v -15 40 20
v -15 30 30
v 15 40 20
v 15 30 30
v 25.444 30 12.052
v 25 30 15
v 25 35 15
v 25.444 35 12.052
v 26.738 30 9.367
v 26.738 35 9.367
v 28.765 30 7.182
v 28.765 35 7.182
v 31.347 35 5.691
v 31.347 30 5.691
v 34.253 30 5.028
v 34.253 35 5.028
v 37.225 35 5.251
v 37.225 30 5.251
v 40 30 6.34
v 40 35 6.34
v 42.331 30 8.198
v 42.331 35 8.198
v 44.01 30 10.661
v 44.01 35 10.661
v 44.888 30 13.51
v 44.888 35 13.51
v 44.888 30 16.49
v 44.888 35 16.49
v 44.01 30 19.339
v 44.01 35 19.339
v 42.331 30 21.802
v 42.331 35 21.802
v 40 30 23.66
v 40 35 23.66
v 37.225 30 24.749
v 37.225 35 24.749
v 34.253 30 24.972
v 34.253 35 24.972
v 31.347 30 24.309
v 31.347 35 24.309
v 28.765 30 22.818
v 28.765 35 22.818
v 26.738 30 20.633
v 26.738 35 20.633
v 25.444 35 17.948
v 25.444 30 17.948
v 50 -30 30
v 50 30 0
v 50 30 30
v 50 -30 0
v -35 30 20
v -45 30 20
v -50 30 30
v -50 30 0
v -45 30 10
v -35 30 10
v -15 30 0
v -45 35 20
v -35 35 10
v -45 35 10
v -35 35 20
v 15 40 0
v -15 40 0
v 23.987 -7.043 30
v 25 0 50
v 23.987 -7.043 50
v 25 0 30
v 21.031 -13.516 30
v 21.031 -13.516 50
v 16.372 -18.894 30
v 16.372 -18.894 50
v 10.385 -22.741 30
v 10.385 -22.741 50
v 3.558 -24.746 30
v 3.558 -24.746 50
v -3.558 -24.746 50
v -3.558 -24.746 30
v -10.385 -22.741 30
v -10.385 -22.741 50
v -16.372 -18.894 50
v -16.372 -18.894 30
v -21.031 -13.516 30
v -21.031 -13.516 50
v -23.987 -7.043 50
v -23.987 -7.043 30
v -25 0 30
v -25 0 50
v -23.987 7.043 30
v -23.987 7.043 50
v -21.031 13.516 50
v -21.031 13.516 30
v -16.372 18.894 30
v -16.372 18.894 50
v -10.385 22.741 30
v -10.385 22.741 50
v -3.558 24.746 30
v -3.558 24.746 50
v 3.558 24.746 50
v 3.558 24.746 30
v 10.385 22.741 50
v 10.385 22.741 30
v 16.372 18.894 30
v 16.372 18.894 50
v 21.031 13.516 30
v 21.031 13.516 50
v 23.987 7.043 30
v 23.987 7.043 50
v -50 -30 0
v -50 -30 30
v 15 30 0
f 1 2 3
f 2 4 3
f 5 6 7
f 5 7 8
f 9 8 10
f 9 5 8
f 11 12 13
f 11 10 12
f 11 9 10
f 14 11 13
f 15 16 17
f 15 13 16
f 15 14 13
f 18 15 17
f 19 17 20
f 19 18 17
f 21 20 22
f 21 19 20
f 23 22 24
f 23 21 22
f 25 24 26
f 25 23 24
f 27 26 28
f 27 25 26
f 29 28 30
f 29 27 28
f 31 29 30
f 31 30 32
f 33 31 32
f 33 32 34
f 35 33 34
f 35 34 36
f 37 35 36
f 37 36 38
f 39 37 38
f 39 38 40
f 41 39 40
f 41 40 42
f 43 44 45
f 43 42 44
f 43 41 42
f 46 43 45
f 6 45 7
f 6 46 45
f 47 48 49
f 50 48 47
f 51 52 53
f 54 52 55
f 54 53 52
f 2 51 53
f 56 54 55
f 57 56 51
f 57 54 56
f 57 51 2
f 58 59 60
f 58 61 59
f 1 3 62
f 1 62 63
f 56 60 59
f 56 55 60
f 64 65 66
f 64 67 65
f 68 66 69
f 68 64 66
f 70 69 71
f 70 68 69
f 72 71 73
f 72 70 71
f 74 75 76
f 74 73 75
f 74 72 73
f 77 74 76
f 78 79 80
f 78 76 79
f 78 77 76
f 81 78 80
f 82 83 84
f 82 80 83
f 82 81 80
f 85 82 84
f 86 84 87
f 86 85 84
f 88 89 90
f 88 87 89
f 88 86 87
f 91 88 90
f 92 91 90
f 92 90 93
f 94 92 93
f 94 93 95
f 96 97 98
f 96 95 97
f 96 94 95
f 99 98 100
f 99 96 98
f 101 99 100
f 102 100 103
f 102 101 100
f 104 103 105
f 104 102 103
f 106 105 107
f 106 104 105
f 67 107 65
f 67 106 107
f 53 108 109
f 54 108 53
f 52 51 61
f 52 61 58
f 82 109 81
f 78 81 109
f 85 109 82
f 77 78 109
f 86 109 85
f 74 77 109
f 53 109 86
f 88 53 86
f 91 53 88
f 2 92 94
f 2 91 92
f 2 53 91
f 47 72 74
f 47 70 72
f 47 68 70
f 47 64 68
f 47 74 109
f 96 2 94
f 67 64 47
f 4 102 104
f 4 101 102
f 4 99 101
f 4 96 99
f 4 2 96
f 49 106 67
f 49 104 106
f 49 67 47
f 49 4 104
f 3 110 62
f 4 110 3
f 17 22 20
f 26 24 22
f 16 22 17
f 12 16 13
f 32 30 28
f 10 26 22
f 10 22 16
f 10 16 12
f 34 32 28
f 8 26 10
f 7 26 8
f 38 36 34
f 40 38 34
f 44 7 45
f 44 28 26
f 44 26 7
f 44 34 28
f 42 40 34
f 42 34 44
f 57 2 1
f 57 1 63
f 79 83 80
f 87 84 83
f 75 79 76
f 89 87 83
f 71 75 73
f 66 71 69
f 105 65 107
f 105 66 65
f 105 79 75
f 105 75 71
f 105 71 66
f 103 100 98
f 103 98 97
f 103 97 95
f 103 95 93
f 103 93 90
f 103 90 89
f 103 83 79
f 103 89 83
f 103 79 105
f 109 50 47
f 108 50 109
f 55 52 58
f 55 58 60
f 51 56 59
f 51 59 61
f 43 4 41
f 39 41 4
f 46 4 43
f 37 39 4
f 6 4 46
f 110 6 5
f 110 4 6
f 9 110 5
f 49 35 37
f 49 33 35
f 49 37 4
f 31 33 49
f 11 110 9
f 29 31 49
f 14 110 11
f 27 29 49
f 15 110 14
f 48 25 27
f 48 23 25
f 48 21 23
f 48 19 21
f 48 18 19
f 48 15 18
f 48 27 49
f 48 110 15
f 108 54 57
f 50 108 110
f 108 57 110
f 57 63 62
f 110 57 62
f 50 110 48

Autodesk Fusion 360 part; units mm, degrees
sketch "Sketch1" plane through (0, 0, 0) normal (0, 0, 1) x (1, 0, 0)
  line L0 (-50, 30) -> (50, 30)
  line L1 (50, 30) -> (50, -30)
  line L2 (50, -30) -> (-50, -30)
  line L3 (-50, -30) -> (-50, 30)
  dimension "d1" = 100
  dimension "d2" = 60
  dimension "d4" = 30
  dimension "d5" = 50
extrude "Extrude1" add sketch "Sketch1" along normal blind 30
sketch "Sketch2" plane through (0, 0, 30) normal (0, 0, 1) x (1, 0, 0)
  line L0 (-50, -30) -> (50, -30)
  line L1 (50, -30) -> (50, 30)
  line L2 (50, 30) -> (-50, 30)
  line L3 (-50, 30) -> (-50, -30)
  circle A0 centre (0, 0) radius 25
  dimension "d8" = 50
extrude "Extrude2" add sketch "Sketch2" along normal blind 20 contours A0
sketch "Sketch3" plane through (0, 30, 0) normal (0, 1, 0) x (-1, 0, 0)
  line L0 (-50, 0) -> (50, 0)
  line L1 (50, 0) -> (50, 30)
  line L2 (50, 30) -> (-50, 30)
  line L3 (-50, 30) -> (-50, 0)
  line L4 (15, 0) -> (-15, 0)
  line L5 (-15, 0) -> (-15, 30)
  line L6 (-15, 30) -> (15, 30)
  line L7 (15, 30) -> (15, 0)
extrude "Extrude3" add sketch "Sketch3" along normal blind 10 contours L0 L2 L4 L5 L6 L7
sketch "Sketch4" plane through (0, 30, 0) normal (0, 1, 0) x (-1, 0, 0)
  line L0 (-15, 0) -> (-15, 30)
  line L1 (-15, 30) -> (-50, 30)
  line L2 (-50, 30) -> (-50, 0)
  line L3 (-50, 0) -> (-15, 0)
  circle A0 centre (-35, 15) radius 10
  line L4 (45, 10) -> (35, 10)
  line L5 (35, 10) -> (35, 20)
  line L6 (35, 20) -> (45, 20)
  line L7 (45, 20) -> (45, 10)
  line L8 (15, 0) -> (15, 30)
  dimension "d16" = 20
  dimension "d17" = 20
  dimension "d18" = 20
extrude "Extrude4" add sketch "Sketch4" along normal blind 5 contours A0 | L4 L5 L6 L7
sketch "Sketch5" plane through (15, 0, 0) normal (1, 0, 0) x (0, 0, -1)
  line L0 (-30, 30) -> (0, 30)
  line L1 (0, 30) -> (0, 40)
  line L2 (0, 40) -> (-30, 40)
  line L3 (-30, 40) -> (-30, 30)
  line L4 (-30, 40) -> (-30, 30)
  line L5 (-30, 30) -> (-20, 40)
  line L6 (-20, 40) -> (-30, 40)
extrude "Extrude5" cut sketch "Sketch5" against normal blind 35 contours L2 L3 L4 L5 L6
sketch "Sketch6" plane through (0, 0, 50) normal (0, 0, 1) x (1, 0, 0)
  circle A0 centre (0, 0) radius 25
